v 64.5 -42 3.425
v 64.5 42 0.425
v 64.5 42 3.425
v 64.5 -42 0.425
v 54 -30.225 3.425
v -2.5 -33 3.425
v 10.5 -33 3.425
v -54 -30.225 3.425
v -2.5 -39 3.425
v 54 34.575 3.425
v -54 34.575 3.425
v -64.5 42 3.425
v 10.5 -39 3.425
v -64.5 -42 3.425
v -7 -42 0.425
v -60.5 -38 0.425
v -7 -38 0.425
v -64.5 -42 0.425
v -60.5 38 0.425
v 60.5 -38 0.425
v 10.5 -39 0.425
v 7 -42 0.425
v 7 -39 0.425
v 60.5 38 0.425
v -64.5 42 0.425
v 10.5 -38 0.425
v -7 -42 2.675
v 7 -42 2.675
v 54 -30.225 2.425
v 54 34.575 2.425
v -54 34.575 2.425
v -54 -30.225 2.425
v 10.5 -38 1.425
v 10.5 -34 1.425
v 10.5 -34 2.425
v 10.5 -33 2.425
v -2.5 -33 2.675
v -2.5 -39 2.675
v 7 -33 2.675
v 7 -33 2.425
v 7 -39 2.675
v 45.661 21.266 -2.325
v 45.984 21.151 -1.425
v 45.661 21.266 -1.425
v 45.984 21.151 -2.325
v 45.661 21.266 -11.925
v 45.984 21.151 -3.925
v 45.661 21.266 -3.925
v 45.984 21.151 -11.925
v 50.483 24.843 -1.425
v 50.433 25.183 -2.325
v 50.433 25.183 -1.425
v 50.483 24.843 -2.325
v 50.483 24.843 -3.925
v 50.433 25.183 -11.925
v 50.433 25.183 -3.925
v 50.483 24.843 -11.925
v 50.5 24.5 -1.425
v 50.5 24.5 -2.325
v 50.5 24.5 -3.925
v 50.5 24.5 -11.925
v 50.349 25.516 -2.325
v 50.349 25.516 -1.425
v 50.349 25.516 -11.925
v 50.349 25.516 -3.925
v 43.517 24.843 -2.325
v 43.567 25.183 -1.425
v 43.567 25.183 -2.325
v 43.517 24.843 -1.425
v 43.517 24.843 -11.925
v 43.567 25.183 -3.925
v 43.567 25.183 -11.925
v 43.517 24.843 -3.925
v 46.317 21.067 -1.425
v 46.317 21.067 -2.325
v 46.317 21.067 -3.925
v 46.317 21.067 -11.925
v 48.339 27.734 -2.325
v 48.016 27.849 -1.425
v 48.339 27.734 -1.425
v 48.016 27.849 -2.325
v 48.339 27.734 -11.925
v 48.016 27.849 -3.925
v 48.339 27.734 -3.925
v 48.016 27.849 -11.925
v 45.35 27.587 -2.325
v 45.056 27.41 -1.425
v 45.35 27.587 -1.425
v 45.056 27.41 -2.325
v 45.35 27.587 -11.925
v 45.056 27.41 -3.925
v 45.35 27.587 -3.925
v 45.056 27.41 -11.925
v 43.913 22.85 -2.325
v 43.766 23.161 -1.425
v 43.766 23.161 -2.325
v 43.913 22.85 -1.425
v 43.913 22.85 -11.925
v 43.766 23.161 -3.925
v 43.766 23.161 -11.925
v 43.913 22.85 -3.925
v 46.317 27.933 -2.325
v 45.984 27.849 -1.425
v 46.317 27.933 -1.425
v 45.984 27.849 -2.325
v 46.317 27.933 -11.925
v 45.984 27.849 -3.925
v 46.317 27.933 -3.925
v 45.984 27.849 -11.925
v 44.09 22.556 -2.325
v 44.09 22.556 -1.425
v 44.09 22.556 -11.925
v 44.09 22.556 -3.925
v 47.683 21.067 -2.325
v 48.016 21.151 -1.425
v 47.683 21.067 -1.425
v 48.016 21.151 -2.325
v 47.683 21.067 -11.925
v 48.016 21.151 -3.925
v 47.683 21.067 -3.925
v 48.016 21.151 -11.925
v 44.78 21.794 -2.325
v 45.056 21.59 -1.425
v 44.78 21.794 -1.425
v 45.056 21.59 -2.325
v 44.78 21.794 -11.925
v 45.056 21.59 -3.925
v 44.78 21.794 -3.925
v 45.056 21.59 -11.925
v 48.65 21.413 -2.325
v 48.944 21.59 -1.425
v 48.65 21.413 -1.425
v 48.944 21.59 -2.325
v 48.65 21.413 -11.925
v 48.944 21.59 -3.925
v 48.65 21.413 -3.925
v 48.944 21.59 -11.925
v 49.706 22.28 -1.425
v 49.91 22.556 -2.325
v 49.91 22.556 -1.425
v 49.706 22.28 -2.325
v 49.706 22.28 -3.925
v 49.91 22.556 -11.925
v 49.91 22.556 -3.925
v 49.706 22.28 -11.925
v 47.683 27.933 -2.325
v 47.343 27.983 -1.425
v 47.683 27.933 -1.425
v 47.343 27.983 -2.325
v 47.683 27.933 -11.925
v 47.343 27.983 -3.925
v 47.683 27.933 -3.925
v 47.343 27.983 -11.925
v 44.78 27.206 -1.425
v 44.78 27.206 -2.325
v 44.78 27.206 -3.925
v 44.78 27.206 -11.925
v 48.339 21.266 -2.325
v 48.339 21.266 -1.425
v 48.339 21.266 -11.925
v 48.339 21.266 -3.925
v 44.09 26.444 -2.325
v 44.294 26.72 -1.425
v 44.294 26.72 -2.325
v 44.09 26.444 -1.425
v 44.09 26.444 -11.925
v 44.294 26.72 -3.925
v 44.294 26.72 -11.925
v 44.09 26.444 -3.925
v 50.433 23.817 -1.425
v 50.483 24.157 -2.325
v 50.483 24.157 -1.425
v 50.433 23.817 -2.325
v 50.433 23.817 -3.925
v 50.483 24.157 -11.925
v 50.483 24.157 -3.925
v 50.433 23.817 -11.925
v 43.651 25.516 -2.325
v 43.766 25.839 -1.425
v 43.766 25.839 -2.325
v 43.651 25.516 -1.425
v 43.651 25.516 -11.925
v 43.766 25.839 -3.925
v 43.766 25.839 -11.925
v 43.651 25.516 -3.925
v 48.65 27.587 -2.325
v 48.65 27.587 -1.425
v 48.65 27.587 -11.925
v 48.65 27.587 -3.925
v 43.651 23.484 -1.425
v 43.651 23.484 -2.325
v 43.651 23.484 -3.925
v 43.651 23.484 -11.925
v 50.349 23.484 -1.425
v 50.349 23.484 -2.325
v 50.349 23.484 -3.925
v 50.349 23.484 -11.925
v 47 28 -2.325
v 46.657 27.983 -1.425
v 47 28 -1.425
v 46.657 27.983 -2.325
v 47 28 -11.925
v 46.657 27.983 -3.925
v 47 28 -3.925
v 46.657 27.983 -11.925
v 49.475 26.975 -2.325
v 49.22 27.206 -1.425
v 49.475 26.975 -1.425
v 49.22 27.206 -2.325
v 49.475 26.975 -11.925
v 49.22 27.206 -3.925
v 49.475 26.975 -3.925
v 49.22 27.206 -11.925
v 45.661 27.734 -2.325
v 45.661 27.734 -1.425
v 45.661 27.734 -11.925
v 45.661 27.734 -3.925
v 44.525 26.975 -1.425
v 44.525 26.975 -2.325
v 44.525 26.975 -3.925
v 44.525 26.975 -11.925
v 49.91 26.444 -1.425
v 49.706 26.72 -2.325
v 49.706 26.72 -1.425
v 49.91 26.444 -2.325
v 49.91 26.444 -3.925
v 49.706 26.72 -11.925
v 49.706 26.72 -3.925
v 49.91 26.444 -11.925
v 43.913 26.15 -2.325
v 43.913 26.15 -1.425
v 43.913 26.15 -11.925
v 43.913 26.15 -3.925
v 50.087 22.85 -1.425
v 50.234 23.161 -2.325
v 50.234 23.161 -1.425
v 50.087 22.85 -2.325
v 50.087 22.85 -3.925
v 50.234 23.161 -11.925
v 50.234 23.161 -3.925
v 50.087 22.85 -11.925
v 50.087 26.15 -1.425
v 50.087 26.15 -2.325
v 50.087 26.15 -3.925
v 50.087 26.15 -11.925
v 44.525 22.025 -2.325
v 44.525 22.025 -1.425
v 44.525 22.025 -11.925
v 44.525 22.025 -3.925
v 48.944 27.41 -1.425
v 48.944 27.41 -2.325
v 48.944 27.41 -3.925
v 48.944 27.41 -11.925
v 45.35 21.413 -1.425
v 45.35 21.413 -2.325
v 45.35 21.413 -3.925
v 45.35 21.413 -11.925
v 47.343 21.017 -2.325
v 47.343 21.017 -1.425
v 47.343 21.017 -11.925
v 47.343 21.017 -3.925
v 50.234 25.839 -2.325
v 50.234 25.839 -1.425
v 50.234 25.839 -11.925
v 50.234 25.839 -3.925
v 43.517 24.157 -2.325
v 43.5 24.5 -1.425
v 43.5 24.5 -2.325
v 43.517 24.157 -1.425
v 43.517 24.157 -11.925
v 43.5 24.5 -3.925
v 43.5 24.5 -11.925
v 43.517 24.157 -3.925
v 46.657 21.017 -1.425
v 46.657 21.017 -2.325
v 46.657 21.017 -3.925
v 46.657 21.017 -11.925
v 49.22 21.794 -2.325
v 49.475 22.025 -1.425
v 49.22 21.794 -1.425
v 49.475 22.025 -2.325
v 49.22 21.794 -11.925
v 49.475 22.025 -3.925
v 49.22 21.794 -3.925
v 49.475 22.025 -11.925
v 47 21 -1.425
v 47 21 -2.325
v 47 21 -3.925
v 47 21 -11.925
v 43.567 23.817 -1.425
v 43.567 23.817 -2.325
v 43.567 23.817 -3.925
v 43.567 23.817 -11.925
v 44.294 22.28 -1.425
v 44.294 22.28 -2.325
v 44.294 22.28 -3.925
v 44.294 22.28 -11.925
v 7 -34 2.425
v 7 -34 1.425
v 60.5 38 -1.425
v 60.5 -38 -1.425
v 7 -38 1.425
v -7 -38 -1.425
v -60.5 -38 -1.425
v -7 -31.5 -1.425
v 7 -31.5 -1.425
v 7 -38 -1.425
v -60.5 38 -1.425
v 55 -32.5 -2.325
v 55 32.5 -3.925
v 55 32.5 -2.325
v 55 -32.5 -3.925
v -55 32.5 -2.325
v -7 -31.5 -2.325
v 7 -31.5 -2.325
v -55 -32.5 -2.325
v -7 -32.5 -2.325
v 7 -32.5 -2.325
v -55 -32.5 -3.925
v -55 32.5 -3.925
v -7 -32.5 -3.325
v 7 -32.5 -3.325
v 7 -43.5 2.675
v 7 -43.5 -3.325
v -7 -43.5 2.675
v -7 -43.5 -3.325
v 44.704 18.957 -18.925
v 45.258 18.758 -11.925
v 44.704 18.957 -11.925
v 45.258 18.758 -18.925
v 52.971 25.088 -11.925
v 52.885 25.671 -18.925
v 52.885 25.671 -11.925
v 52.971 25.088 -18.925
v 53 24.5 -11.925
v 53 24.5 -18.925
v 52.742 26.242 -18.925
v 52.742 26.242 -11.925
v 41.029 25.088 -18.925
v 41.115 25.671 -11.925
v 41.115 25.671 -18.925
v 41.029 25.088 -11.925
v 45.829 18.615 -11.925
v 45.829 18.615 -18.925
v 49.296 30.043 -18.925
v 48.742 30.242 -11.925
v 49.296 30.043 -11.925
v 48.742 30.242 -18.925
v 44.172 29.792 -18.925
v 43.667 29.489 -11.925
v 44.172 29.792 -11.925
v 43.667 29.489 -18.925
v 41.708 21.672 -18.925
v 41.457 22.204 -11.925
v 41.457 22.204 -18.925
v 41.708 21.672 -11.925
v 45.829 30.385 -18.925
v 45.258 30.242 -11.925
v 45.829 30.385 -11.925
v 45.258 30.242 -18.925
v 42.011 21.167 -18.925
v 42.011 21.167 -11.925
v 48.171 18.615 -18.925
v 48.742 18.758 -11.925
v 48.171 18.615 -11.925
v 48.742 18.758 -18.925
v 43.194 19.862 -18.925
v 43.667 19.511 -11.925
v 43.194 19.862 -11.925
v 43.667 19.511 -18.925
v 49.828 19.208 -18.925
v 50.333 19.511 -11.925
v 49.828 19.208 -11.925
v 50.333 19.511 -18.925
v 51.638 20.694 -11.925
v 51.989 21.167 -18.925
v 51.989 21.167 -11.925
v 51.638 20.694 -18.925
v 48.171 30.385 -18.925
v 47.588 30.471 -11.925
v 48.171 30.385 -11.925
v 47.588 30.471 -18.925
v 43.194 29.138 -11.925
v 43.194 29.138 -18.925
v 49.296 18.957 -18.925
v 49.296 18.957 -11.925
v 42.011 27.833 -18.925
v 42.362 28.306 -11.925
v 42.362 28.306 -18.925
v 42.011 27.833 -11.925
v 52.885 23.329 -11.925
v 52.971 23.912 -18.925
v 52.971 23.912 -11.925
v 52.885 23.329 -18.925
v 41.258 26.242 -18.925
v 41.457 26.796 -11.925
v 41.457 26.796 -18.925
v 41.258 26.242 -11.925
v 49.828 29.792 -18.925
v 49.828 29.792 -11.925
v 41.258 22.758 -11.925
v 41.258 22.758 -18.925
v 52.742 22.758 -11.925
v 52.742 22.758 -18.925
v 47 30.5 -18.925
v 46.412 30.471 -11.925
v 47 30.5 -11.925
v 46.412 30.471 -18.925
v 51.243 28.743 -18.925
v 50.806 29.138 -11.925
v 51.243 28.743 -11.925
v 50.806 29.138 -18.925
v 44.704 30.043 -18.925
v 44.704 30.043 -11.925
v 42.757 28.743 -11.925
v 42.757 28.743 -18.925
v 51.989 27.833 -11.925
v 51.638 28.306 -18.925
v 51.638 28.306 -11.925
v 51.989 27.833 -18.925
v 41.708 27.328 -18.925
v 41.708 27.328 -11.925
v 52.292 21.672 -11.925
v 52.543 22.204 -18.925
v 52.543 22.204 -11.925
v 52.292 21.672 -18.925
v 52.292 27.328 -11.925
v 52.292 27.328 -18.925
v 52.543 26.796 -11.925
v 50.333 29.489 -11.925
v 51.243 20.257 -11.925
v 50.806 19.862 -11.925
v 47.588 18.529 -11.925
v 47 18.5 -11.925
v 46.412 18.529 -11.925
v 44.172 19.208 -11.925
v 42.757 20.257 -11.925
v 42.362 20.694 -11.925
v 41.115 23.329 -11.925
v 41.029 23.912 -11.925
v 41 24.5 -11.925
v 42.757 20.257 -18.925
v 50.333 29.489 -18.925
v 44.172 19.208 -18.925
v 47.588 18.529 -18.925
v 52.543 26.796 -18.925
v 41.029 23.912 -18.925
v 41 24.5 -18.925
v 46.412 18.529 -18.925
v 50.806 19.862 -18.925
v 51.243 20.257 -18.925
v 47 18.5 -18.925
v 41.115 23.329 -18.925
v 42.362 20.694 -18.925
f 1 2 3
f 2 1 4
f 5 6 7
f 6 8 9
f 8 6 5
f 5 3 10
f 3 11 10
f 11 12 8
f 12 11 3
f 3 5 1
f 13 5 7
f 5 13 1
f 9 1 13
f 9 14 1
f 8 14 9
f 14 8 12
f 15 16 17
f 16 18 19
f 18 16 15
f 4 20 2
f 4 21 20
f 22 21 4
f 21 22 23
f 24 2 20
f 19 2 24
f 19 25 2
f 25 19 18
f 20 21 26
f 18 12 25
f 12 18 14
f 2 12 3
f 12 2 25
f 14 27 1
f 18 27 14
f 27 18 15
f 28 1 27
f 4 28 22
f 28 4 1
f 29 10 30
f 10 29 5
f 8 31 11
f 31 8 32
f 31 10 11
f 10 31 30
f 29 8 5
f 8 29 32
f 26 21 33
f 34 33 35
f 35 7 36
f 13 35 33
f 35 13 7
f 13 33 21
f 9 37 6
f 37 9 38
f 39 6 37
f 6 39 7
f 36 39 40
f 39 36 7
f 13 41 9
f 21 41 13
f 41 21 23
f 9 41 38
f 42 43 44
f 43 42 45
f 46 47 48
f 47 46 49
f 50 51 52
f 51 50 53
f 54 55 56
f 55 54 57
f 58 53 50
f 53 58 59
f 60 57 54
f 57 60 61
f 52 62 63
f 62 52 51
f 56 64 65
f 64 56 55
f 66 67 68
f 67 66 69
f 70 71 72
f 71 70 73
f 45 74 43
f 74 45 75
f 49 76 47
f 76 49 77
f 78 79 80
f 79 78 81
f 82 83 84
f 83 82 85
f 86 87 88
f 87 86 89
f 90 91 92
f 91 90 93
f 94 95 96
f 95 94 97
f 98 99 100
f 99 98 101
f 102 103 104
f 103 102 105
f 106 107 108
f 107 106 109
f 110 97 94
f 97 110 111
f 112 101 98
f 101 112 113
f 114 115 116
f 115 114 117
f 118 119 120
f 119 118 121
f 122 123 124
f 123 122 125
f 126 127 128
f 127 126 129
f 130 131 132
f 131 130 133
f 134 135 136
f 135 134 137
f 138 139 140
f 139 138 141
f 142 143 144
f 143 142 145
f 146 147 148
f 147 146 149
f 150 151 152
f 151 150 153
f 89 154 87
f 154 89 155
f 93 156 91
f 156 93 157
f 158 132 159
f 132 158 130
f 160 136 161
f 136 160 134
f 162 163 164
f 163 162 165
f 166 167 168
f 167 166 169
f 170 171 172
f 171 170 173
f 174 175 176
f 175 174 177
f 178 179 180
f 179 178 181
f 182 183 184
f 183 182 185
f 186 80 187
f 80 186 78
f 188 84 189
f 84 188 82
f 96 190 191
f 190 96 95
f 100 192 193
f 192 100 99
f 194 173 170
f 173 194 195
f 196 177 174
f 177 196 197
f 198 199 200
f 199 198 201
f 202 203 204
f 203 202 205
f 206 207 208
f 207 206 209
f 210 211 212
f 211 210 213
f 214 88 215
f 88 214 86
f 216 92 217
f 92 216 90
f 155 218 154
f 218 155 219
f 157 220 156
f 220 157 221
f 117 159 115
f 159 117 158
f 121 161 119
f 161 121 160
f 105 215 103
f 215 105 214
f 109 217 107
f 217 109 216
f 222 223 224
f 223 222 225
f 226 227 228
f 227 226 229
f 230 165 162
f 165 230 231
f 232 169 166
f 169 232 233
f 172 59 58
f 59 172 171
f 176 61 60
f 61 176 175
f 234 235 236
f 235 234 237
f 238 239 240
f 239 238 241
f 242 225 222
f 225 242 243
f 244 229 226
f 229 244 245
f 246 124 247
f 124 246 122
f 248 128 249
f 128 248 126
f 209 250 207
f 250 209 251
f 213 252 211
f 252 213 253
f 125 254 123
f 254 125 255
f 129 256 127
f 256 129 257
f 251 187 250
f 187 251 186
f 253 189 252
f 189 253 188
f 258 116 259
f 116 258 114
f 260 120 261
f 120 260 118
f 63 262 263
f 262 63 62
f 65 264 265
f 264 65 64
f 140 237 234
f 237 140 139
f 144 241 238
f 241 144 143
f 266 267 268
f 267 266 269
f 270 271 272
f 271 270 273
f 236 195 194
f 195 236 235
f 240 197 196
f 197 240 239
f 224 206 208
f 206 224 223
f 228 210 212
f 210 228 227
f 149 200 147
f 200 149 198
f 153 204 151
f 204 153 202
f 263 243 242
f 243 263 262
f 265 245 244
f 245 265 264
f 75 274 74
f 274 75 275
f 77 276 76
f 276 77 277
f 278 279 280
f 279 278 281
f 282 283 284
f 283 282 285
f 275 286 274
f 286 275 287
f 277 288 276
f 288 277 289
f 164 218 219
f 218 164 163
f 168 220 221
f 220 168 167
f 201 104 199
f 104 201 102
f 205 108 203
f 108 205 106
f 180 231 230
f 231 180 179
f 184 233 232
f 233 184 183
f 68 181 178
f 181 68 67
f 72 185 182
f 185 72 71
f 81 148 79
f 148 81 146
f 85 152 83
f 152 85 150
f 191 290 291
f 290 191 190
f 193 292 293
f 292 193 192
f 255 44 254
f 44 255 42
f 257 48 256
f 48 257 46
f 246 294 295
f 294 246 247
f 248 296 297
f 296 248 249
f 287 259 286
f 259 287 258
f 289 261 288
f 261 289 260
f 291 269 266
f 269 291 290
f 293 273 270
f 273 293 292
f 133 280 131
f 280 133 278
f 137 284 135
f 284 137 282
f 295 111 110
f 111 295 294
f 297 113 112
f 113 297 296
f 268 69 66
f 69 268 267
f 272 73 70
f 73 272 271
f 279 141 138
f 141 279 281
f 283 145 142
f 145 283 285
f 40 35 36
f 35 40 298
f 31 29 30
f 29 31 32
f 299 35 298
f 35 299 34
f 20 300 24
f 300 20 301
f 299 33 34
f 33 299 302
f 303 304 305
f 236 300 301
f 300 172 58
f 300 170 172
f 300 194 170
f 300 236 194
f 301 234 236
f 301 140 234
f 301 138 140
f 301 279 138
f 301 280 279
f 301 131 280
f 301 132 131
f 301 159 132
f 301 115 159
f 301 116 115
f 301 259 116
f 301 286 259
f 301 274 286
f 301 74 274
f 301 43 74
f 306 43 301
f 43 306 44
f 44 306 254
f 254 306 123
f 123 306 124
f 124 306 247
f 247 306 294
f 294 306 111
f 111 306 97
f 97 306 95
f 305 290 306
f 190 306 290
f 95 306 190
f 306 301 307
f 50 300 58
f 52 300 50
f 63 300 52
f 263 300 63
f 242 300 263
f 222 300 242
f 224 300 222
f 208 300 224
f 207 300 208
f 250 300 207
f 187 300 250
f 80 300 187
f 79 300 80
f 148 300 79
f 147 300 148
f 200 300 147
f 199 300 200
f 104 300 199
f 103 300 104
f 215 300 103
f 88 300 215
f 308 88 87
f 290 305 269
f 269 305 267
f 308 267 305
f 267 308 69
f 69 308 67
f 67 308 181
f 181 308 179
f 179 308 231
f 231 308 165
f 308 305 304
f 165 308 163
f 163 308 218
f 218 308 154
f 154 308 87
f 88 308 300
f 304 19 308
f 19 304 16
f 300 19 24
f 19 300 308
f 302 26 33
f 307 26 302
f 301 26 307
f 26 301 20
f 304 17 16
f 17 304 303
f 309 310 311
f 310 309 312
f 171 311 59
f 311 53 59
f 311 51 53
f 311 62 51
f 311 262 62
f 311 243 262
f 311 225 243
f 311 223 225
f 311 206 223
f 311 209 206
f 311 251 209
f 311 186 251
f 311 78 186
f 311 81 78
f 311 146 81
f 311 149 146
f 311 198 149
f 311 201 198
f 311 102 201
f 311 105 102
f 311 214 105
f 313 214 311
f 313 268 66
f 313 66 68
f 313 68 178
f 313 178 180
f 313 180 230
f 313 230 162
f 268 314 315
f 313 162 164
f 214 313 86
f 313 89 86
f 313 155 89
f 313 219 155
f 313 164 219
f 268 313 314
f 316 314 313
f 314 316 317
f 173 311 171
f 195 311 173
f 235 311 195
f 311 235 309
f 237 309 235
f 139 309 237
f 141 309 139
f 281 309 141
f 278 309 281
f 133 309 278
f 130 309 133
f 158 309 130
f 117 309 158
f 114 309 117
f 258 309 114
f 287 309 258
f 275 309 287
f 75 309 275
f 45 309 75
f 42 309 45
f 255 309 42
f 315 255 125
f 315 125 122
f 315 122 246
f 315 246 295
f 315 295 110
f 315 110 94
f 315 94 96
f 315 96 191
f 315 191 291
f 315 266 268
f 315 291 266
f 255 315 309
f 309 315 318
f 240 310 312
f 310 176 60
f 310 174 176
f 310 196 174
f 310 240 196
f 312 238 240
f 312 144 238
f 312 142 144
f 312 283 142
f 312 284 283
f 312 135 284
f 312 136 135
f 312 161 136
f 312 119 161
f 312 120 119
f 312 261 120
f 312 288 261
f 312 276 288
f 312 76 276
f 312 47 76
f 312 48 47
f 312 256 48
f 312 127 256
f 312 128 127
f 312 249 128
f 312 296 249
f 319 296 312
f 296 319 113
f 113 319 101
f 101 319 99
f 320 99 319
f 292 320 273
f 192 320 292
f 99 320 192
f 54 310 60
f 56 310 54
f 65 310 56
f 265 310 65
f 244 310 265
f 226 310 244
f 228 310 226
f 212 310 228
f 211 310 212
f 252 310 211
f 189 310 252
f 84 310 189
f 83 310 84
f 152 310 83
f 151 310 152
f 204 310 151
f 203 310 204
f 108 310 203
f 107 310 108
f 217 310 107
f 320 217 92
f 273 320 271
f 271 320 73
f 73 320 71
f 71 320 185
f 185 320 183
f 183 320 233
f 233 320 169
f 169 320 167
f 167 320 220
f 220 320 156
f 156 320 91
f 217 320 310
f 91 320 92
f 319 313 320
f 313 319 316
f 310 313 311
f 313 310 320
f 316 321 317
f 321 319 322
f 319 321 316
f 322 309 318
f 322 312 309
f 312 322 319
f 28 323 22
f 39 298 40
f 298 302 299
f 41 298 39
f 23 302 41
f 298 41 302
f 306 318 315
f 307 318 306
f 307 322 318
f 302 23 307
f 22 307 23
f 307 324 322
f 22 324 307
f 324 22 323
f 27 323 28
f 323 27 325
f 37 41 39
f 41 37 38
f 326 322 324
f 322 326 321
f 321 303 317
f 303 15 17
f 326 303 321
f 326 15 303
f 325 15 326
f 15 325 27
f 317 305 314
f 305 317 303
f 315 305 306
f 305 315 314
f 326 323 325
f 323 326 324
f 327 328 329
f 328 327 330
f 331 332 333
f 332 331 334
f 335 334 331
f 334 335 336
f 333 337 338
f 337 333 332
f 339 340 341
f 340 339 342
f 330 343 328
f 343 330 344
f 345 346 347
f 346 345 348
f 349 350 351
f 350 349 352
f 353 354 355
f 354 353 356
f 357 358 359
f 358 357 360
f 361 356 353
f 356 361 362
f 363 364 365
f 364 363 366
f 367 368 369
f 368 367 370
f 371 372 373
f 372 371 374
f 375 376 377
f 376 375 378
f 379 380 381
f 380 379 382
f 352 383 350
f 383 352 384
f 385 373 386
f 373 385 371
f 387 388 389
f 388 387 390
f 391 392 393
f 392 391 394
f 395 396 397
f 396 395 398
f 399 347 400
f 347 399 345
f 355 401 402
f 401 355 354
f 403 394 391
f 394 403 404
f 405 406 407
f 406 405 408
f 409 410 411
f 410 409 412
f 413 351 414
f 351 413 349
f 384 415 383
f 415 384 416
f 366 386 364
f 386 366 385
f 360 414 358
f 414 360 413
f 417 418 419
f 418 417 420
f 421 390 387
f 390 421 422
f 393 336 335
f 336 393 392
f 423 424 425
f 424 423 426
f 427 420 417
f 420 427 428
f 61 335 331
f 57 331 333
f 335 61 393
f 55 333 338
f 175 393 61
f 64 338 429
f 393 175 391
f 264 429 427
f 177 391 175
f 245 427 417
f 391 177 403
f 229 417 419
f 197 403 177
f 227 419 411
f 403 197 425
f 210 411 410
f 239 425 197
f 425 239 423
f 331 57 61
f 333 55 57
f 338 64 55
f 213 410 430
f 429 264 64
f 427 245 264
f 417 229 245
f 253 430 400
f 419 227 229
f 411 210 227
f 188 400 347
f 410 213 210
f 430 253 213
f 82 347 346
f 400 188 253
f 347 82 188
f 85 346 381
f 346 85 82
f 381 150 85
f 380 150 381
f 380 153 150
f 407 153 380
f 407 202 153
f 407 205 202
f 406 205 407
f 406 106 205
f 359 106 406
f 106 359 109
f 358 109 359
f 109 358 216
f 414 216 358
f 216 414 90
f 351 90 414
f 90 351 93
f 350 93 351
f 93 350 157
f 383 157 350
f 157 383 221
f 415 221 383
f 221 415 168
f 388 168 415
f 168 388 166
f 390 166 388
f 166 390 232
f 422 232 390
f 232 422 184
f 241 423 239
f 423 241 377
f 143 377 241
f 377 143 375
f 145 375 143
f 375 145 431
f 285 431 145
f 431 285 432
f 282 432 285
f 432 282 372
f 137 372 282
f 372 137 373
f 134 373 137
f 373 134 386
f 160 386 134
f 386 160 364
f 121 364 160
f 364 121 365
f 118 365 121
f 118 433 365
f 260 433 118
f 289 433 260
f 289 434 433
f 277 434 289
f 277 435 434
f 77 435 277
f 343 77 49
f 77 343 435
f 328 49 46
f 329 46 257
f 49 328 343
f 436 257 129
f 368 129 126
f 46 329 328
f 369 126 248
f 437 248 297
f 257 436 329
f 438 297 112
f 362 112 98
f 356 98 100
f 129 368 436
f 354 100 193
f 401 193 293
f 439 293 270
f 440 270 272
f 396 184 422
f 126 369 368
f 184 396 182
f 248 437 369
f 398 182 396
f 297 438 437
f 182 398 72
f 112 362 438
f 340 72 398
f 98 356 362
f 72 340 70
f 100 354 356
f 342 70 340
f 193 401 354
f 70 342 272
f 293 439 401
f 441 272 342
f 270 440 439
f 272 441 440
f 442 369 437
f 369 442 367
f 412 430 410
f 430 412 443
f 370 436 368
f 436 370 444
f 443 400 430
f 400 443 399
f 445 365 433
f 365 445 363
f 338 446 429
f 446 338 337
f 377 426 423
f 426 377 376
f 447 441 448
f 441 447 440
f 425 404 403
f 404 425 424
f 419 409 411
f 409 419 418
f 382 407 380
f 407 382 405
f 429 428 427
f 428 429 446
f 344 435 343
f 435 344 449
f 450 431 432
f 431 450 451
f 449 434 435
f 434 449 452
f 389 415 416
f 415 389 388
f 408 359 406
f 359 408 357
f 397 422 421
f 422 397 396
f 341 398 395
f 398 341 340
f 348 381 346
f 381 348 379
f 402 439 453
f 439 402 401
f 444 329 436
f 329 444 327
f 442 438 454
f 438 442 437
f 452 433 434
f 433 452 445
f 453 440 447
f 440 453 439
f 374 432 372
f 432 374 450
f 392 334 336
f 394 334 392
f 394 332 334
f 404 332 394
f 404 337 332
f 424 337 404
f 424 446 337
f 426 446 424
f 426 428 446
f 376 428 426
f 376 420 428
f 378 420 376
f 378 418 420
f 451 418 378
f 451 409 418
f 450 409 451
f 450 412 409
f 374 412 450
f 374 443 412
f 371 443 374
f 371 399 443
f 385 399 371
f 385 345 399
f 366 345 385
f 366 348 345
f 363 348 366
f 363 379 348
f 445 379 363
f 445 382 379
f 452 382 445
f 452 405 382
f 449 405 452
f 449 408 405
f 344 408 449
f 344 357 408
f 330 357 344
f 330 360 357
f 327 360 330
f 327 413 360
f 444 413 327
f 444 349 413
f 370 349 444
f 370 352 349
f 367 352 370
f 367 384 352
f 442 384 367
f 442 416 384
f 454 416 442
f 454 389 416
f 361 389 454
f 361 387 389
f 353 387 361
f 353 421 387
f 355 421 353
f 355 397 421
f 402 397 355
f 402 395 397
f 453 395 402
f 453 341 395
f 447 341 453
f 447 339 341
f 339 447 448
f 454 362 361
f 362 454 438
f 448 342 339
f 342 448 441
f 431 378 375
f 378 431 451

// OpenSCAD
$fn = 64;

// Parameters
display_width = 121; //[60.5:242:0.5]
display_height = 76; //[38:152:0.5]
display_thickness = 2.85; //[1.4:5.7:0.05]

pcb_offset_x = 0; //[-10:10:0.5]
pcb_offset_y = 0; //[-10:10:0.5]
pcb_offset_z = 1.9; //[0:10:0.1]

aperture_min_x = -54; //[-108:-27:0.5]
aperture_min_y = -30.225; //[-60.45:-15.1125:0.5]
aperture_max_x = 54; //[27:108:0.5]
aperture_max_y = 34.575; //[17.2875:69.15:0.5]
aperture_depth = 0.5; //[0.2:2:0.1]

touch_min_x = -58.7; //[-117.4:-29.35:0.5]
touch_min_y = -34; //[-68:-17:0.5]
touch_max_x = 58.7; //[29.35:117.4:0.5]
touch_max_y = 36.25; //[18.125:72.5:0.5]
touch_thickness = 1; //[0.5:3:0.1]

bezel_thickness = 3; //[1.5:8:0.25]
bezel_margin = 4; //[2:12:0.5]
overlap = 1; //[0.5:2:0.1]

pcb_thickness = 1.6; //[0.8:3.2:0.1]
pcb_width = 110; //[55:220:0.5]
pcb_height = 65; //[32.5:130:0.5]
pcb_back_clearance = 2; //[1:8:0.25]

mount_boss_radius = 3.5; //[2:7:0.25]
mount_hole_radius = 1.6; //[1:3:0.1]
mount_boss_inset = 8; //[4:20:0.5]
thread_length = 2; // thread length

ts_ribbon_min_x = -2.5; //[-10:0:0.5]
ts_ribbon_min_y = -39; //[-78:-19.5:0.5]
ts_ribbon_max_x = 10.5; //[5.25:21:0.5]
ts_ribbon_max_y = -33; //[-66:-16.5:0.5]
ts_ribbon_depth = 6; //[3:15:0.5]

hdmi_width = 14; //[7:28:0.5]
hdmi_height = 6; //[3:12:0.25]
hdmi_depth = 12; //[6:24:0.5]

knob_radius = 6; //[3:12:0.5]
knob_height = 5; //[2.5:12:0.5]
knob_shaft_radius = 1.5; //[0.8:3:0.1]
knob_shaft_length = 6; //[3:15:0.5]

// Derived sizes/centers
ap_w = aperture_max_x - aperture_min_x;
ap_h = aperture_max_y - aperture_min_y;
ap_cx = (aperture_min_x + aperture_max_x)/2;
ap_cy = (aperture_min_y + aperture_max_y)/2;

ts_w = touch_max_x - touch_min_x;
ts_h = touch_max_y - touch_min_y;
ts_cx = (touch_min_x + touch_max_x)/2;
ts_cy = (touch_min_y + touch_max_y)/2;

rib_w = ts_ribbon_max_x - ts_ribbon_min_x;
rib_h = ts_ribbon_max_y - ts_ribbon_min_y;
rib_cx = (ts_ribbon_min_x + ts_ribbon_max_x)/2;
rib_cy = (ts_ribbon_min_y + ts_ribbon_max_y)/2;

bezel_w = display_width + 2*bezel_margin;
bezel_h = display_height + 2*bezel_margin;

// Z stack (centered around display at z=0)
z_display_c = 0;
z_display_top = z_display_c + display_thickness/2;
z_display_bot = z_display_c - display_thickness/2;

z_touch_c = z_display_top + touch_thickness/2 - overlap; // touch sits on display
z_touch_top = z_touch_c + touch_thickness/2;
z_touch_bot = z_touch_c - touch_thickness/2;

z_bezel_c = z_touch_top + bezel_thickness/2 - overlap;   // bezel sits on touch
z_bezel_top = z_bezel_c + bezel_thickness/2;
z_bezel_bot = z_bezel_c - bezel_thickness/2;

z_pcb_c = z_display_bot - pcb_offset_z - pcb_thickness/2 + overlap; // pcb behind display
z_pcb_top = z_pcb_c + pcb_thickness/2;
z_pcb_bot = z_pcb_c - pcb_thickness/2;

// Helpers
module box_xy(x0, y0, x1, y1, z0, z1) {
  translate([(x0+x1)/2, (y0+y1)/2, (z0+z1)/2])
    cube([abs(x1-x0), abs(y1-y0), abs(z1-z0)], center=true);
}

// Main connected solid (single manifold)
module connected_solid() {

  // Mount boss placement (used by multiple parts)
  boss_x = pcb_offset_x + pcb_width/2 - mount_boss_inset;
  boss_y = pcb_offset_y + pcb_height/2 - mount_boss_inset;

  // Boss spans from PCB top down to knob bottom (guaranteed connectivity)
  boss_top = z_pcb_top + overlap;
  boss_bot = (z_pcb_bot - pcb_back_clearance - knob_shaft_length - knob_height) - overlap;
  boss_h = boss_top - boss_bot;
  boss_zc = (boss_top + boss_bot)/2;

  // Knob + shaft Z (attached to boss bottom)
  knob_top = boss_bot + knob_height + overlap;
  knob_bot = boss_bot - overlap;
  knob_zc = (knob_top + knob_bot)/2;

  shaft_top = boss_bot + knob_shaft_length + overlap;
  shaft_bot = boss_bot - overlap;
  shaft_zc = (shaft_top + shaft_bot)/2;

  union() {

    // Bezel with real aperture cut-through + ribbon clearance notch
    color("Silver")
    difference() {
      translate([0,0,z_bezel_c])
        cube([bezel_w, bezel_h, bezel_thickness], center=true);

      // Display aperture: cut from bezel front face down to specified depth
      // (front face = +Z)
      translate([ap_cx, ap_cy, z_bezel_top - aperture_depth/2])
        cube([ap_w, ap_h, aperture_depth + 2*overlap], center=true);

      // Touchscreen ribbon clearance: cut from bezel bottom face upward
      translate([rib_cx, rib_cy, z_bezel_bot + ts_ribbon_depth/2])
        cube([rib_w, rib_h, ts_ribbon_depth + 2*overlap], center=true);
    }

    // Touchscreen glass outline/overhang (visible in ortho views)
    // Slightly overlaps into bezel and display to keep one connected solid.
    color([0.2,0.2,0.2,0.35])
      translate([ts_cx, ts_cy, z_touch_c])
        cube([ts_w, ts_h, touch_thickness + 2*overlap], center=true);

    // Display body
    color("Black")
      translate([0,0,z_display_c])
        cube([display_width, display_height, display_thickness], center=true);

    // PCB (connected to display via overlap)
    color([0.0, 0.4, 0.2])
      translate([pcb_offset_x, pcb_offset_y, z_pcb_c])
        cube([pcb_width, pcb_height, pcb_thickness], center=true);

    // HDMI connector (attached to PCB edge, not floating)
    color("DimGray")
      translate([
        pcb_offset_x,
        pcb_offset_y - pcb_height/2 - hdmi_depth/2 + overlap,
        z_pcb_top - overlap + hdmi_height/2
      ])
        cube([hdmi_width, hdmi_depth, hdmi_height], center=true);

    // Mount boss + threaded hole (thread length = 2mm)
    color("Gray")
    difference() {
      translate([boss_x, boss_y, boss_zc])
        cylinder(r=mount_boss_radius, h=boss_h, center=true);

      // Threaded hole: 2mm deep from the very bottom of boss upward
      translate([boss_x, boss_y, boss_bot + thread_length/2])
        cylinder(r=mount_hole_radius, h=thread_length + 2*overlap, center=true);
    }

    // Knob: attached to boss bottom (no floating)
    color("Brass")
      translate([boss_x, boss_y, knob_zc])
        cylinder(r=knob_radius, h=(knob_top - knob_bot), center=true);

    // Shaft: overlaps into boss bottom and into knob
    color("Brass")
      translate([boss_x, boss_y, shaft_zc])
        cylinder(r=knob_shaft_radius, h=(shaft_top - shaft_bot), center=true);
  }
}

connected_solid();
